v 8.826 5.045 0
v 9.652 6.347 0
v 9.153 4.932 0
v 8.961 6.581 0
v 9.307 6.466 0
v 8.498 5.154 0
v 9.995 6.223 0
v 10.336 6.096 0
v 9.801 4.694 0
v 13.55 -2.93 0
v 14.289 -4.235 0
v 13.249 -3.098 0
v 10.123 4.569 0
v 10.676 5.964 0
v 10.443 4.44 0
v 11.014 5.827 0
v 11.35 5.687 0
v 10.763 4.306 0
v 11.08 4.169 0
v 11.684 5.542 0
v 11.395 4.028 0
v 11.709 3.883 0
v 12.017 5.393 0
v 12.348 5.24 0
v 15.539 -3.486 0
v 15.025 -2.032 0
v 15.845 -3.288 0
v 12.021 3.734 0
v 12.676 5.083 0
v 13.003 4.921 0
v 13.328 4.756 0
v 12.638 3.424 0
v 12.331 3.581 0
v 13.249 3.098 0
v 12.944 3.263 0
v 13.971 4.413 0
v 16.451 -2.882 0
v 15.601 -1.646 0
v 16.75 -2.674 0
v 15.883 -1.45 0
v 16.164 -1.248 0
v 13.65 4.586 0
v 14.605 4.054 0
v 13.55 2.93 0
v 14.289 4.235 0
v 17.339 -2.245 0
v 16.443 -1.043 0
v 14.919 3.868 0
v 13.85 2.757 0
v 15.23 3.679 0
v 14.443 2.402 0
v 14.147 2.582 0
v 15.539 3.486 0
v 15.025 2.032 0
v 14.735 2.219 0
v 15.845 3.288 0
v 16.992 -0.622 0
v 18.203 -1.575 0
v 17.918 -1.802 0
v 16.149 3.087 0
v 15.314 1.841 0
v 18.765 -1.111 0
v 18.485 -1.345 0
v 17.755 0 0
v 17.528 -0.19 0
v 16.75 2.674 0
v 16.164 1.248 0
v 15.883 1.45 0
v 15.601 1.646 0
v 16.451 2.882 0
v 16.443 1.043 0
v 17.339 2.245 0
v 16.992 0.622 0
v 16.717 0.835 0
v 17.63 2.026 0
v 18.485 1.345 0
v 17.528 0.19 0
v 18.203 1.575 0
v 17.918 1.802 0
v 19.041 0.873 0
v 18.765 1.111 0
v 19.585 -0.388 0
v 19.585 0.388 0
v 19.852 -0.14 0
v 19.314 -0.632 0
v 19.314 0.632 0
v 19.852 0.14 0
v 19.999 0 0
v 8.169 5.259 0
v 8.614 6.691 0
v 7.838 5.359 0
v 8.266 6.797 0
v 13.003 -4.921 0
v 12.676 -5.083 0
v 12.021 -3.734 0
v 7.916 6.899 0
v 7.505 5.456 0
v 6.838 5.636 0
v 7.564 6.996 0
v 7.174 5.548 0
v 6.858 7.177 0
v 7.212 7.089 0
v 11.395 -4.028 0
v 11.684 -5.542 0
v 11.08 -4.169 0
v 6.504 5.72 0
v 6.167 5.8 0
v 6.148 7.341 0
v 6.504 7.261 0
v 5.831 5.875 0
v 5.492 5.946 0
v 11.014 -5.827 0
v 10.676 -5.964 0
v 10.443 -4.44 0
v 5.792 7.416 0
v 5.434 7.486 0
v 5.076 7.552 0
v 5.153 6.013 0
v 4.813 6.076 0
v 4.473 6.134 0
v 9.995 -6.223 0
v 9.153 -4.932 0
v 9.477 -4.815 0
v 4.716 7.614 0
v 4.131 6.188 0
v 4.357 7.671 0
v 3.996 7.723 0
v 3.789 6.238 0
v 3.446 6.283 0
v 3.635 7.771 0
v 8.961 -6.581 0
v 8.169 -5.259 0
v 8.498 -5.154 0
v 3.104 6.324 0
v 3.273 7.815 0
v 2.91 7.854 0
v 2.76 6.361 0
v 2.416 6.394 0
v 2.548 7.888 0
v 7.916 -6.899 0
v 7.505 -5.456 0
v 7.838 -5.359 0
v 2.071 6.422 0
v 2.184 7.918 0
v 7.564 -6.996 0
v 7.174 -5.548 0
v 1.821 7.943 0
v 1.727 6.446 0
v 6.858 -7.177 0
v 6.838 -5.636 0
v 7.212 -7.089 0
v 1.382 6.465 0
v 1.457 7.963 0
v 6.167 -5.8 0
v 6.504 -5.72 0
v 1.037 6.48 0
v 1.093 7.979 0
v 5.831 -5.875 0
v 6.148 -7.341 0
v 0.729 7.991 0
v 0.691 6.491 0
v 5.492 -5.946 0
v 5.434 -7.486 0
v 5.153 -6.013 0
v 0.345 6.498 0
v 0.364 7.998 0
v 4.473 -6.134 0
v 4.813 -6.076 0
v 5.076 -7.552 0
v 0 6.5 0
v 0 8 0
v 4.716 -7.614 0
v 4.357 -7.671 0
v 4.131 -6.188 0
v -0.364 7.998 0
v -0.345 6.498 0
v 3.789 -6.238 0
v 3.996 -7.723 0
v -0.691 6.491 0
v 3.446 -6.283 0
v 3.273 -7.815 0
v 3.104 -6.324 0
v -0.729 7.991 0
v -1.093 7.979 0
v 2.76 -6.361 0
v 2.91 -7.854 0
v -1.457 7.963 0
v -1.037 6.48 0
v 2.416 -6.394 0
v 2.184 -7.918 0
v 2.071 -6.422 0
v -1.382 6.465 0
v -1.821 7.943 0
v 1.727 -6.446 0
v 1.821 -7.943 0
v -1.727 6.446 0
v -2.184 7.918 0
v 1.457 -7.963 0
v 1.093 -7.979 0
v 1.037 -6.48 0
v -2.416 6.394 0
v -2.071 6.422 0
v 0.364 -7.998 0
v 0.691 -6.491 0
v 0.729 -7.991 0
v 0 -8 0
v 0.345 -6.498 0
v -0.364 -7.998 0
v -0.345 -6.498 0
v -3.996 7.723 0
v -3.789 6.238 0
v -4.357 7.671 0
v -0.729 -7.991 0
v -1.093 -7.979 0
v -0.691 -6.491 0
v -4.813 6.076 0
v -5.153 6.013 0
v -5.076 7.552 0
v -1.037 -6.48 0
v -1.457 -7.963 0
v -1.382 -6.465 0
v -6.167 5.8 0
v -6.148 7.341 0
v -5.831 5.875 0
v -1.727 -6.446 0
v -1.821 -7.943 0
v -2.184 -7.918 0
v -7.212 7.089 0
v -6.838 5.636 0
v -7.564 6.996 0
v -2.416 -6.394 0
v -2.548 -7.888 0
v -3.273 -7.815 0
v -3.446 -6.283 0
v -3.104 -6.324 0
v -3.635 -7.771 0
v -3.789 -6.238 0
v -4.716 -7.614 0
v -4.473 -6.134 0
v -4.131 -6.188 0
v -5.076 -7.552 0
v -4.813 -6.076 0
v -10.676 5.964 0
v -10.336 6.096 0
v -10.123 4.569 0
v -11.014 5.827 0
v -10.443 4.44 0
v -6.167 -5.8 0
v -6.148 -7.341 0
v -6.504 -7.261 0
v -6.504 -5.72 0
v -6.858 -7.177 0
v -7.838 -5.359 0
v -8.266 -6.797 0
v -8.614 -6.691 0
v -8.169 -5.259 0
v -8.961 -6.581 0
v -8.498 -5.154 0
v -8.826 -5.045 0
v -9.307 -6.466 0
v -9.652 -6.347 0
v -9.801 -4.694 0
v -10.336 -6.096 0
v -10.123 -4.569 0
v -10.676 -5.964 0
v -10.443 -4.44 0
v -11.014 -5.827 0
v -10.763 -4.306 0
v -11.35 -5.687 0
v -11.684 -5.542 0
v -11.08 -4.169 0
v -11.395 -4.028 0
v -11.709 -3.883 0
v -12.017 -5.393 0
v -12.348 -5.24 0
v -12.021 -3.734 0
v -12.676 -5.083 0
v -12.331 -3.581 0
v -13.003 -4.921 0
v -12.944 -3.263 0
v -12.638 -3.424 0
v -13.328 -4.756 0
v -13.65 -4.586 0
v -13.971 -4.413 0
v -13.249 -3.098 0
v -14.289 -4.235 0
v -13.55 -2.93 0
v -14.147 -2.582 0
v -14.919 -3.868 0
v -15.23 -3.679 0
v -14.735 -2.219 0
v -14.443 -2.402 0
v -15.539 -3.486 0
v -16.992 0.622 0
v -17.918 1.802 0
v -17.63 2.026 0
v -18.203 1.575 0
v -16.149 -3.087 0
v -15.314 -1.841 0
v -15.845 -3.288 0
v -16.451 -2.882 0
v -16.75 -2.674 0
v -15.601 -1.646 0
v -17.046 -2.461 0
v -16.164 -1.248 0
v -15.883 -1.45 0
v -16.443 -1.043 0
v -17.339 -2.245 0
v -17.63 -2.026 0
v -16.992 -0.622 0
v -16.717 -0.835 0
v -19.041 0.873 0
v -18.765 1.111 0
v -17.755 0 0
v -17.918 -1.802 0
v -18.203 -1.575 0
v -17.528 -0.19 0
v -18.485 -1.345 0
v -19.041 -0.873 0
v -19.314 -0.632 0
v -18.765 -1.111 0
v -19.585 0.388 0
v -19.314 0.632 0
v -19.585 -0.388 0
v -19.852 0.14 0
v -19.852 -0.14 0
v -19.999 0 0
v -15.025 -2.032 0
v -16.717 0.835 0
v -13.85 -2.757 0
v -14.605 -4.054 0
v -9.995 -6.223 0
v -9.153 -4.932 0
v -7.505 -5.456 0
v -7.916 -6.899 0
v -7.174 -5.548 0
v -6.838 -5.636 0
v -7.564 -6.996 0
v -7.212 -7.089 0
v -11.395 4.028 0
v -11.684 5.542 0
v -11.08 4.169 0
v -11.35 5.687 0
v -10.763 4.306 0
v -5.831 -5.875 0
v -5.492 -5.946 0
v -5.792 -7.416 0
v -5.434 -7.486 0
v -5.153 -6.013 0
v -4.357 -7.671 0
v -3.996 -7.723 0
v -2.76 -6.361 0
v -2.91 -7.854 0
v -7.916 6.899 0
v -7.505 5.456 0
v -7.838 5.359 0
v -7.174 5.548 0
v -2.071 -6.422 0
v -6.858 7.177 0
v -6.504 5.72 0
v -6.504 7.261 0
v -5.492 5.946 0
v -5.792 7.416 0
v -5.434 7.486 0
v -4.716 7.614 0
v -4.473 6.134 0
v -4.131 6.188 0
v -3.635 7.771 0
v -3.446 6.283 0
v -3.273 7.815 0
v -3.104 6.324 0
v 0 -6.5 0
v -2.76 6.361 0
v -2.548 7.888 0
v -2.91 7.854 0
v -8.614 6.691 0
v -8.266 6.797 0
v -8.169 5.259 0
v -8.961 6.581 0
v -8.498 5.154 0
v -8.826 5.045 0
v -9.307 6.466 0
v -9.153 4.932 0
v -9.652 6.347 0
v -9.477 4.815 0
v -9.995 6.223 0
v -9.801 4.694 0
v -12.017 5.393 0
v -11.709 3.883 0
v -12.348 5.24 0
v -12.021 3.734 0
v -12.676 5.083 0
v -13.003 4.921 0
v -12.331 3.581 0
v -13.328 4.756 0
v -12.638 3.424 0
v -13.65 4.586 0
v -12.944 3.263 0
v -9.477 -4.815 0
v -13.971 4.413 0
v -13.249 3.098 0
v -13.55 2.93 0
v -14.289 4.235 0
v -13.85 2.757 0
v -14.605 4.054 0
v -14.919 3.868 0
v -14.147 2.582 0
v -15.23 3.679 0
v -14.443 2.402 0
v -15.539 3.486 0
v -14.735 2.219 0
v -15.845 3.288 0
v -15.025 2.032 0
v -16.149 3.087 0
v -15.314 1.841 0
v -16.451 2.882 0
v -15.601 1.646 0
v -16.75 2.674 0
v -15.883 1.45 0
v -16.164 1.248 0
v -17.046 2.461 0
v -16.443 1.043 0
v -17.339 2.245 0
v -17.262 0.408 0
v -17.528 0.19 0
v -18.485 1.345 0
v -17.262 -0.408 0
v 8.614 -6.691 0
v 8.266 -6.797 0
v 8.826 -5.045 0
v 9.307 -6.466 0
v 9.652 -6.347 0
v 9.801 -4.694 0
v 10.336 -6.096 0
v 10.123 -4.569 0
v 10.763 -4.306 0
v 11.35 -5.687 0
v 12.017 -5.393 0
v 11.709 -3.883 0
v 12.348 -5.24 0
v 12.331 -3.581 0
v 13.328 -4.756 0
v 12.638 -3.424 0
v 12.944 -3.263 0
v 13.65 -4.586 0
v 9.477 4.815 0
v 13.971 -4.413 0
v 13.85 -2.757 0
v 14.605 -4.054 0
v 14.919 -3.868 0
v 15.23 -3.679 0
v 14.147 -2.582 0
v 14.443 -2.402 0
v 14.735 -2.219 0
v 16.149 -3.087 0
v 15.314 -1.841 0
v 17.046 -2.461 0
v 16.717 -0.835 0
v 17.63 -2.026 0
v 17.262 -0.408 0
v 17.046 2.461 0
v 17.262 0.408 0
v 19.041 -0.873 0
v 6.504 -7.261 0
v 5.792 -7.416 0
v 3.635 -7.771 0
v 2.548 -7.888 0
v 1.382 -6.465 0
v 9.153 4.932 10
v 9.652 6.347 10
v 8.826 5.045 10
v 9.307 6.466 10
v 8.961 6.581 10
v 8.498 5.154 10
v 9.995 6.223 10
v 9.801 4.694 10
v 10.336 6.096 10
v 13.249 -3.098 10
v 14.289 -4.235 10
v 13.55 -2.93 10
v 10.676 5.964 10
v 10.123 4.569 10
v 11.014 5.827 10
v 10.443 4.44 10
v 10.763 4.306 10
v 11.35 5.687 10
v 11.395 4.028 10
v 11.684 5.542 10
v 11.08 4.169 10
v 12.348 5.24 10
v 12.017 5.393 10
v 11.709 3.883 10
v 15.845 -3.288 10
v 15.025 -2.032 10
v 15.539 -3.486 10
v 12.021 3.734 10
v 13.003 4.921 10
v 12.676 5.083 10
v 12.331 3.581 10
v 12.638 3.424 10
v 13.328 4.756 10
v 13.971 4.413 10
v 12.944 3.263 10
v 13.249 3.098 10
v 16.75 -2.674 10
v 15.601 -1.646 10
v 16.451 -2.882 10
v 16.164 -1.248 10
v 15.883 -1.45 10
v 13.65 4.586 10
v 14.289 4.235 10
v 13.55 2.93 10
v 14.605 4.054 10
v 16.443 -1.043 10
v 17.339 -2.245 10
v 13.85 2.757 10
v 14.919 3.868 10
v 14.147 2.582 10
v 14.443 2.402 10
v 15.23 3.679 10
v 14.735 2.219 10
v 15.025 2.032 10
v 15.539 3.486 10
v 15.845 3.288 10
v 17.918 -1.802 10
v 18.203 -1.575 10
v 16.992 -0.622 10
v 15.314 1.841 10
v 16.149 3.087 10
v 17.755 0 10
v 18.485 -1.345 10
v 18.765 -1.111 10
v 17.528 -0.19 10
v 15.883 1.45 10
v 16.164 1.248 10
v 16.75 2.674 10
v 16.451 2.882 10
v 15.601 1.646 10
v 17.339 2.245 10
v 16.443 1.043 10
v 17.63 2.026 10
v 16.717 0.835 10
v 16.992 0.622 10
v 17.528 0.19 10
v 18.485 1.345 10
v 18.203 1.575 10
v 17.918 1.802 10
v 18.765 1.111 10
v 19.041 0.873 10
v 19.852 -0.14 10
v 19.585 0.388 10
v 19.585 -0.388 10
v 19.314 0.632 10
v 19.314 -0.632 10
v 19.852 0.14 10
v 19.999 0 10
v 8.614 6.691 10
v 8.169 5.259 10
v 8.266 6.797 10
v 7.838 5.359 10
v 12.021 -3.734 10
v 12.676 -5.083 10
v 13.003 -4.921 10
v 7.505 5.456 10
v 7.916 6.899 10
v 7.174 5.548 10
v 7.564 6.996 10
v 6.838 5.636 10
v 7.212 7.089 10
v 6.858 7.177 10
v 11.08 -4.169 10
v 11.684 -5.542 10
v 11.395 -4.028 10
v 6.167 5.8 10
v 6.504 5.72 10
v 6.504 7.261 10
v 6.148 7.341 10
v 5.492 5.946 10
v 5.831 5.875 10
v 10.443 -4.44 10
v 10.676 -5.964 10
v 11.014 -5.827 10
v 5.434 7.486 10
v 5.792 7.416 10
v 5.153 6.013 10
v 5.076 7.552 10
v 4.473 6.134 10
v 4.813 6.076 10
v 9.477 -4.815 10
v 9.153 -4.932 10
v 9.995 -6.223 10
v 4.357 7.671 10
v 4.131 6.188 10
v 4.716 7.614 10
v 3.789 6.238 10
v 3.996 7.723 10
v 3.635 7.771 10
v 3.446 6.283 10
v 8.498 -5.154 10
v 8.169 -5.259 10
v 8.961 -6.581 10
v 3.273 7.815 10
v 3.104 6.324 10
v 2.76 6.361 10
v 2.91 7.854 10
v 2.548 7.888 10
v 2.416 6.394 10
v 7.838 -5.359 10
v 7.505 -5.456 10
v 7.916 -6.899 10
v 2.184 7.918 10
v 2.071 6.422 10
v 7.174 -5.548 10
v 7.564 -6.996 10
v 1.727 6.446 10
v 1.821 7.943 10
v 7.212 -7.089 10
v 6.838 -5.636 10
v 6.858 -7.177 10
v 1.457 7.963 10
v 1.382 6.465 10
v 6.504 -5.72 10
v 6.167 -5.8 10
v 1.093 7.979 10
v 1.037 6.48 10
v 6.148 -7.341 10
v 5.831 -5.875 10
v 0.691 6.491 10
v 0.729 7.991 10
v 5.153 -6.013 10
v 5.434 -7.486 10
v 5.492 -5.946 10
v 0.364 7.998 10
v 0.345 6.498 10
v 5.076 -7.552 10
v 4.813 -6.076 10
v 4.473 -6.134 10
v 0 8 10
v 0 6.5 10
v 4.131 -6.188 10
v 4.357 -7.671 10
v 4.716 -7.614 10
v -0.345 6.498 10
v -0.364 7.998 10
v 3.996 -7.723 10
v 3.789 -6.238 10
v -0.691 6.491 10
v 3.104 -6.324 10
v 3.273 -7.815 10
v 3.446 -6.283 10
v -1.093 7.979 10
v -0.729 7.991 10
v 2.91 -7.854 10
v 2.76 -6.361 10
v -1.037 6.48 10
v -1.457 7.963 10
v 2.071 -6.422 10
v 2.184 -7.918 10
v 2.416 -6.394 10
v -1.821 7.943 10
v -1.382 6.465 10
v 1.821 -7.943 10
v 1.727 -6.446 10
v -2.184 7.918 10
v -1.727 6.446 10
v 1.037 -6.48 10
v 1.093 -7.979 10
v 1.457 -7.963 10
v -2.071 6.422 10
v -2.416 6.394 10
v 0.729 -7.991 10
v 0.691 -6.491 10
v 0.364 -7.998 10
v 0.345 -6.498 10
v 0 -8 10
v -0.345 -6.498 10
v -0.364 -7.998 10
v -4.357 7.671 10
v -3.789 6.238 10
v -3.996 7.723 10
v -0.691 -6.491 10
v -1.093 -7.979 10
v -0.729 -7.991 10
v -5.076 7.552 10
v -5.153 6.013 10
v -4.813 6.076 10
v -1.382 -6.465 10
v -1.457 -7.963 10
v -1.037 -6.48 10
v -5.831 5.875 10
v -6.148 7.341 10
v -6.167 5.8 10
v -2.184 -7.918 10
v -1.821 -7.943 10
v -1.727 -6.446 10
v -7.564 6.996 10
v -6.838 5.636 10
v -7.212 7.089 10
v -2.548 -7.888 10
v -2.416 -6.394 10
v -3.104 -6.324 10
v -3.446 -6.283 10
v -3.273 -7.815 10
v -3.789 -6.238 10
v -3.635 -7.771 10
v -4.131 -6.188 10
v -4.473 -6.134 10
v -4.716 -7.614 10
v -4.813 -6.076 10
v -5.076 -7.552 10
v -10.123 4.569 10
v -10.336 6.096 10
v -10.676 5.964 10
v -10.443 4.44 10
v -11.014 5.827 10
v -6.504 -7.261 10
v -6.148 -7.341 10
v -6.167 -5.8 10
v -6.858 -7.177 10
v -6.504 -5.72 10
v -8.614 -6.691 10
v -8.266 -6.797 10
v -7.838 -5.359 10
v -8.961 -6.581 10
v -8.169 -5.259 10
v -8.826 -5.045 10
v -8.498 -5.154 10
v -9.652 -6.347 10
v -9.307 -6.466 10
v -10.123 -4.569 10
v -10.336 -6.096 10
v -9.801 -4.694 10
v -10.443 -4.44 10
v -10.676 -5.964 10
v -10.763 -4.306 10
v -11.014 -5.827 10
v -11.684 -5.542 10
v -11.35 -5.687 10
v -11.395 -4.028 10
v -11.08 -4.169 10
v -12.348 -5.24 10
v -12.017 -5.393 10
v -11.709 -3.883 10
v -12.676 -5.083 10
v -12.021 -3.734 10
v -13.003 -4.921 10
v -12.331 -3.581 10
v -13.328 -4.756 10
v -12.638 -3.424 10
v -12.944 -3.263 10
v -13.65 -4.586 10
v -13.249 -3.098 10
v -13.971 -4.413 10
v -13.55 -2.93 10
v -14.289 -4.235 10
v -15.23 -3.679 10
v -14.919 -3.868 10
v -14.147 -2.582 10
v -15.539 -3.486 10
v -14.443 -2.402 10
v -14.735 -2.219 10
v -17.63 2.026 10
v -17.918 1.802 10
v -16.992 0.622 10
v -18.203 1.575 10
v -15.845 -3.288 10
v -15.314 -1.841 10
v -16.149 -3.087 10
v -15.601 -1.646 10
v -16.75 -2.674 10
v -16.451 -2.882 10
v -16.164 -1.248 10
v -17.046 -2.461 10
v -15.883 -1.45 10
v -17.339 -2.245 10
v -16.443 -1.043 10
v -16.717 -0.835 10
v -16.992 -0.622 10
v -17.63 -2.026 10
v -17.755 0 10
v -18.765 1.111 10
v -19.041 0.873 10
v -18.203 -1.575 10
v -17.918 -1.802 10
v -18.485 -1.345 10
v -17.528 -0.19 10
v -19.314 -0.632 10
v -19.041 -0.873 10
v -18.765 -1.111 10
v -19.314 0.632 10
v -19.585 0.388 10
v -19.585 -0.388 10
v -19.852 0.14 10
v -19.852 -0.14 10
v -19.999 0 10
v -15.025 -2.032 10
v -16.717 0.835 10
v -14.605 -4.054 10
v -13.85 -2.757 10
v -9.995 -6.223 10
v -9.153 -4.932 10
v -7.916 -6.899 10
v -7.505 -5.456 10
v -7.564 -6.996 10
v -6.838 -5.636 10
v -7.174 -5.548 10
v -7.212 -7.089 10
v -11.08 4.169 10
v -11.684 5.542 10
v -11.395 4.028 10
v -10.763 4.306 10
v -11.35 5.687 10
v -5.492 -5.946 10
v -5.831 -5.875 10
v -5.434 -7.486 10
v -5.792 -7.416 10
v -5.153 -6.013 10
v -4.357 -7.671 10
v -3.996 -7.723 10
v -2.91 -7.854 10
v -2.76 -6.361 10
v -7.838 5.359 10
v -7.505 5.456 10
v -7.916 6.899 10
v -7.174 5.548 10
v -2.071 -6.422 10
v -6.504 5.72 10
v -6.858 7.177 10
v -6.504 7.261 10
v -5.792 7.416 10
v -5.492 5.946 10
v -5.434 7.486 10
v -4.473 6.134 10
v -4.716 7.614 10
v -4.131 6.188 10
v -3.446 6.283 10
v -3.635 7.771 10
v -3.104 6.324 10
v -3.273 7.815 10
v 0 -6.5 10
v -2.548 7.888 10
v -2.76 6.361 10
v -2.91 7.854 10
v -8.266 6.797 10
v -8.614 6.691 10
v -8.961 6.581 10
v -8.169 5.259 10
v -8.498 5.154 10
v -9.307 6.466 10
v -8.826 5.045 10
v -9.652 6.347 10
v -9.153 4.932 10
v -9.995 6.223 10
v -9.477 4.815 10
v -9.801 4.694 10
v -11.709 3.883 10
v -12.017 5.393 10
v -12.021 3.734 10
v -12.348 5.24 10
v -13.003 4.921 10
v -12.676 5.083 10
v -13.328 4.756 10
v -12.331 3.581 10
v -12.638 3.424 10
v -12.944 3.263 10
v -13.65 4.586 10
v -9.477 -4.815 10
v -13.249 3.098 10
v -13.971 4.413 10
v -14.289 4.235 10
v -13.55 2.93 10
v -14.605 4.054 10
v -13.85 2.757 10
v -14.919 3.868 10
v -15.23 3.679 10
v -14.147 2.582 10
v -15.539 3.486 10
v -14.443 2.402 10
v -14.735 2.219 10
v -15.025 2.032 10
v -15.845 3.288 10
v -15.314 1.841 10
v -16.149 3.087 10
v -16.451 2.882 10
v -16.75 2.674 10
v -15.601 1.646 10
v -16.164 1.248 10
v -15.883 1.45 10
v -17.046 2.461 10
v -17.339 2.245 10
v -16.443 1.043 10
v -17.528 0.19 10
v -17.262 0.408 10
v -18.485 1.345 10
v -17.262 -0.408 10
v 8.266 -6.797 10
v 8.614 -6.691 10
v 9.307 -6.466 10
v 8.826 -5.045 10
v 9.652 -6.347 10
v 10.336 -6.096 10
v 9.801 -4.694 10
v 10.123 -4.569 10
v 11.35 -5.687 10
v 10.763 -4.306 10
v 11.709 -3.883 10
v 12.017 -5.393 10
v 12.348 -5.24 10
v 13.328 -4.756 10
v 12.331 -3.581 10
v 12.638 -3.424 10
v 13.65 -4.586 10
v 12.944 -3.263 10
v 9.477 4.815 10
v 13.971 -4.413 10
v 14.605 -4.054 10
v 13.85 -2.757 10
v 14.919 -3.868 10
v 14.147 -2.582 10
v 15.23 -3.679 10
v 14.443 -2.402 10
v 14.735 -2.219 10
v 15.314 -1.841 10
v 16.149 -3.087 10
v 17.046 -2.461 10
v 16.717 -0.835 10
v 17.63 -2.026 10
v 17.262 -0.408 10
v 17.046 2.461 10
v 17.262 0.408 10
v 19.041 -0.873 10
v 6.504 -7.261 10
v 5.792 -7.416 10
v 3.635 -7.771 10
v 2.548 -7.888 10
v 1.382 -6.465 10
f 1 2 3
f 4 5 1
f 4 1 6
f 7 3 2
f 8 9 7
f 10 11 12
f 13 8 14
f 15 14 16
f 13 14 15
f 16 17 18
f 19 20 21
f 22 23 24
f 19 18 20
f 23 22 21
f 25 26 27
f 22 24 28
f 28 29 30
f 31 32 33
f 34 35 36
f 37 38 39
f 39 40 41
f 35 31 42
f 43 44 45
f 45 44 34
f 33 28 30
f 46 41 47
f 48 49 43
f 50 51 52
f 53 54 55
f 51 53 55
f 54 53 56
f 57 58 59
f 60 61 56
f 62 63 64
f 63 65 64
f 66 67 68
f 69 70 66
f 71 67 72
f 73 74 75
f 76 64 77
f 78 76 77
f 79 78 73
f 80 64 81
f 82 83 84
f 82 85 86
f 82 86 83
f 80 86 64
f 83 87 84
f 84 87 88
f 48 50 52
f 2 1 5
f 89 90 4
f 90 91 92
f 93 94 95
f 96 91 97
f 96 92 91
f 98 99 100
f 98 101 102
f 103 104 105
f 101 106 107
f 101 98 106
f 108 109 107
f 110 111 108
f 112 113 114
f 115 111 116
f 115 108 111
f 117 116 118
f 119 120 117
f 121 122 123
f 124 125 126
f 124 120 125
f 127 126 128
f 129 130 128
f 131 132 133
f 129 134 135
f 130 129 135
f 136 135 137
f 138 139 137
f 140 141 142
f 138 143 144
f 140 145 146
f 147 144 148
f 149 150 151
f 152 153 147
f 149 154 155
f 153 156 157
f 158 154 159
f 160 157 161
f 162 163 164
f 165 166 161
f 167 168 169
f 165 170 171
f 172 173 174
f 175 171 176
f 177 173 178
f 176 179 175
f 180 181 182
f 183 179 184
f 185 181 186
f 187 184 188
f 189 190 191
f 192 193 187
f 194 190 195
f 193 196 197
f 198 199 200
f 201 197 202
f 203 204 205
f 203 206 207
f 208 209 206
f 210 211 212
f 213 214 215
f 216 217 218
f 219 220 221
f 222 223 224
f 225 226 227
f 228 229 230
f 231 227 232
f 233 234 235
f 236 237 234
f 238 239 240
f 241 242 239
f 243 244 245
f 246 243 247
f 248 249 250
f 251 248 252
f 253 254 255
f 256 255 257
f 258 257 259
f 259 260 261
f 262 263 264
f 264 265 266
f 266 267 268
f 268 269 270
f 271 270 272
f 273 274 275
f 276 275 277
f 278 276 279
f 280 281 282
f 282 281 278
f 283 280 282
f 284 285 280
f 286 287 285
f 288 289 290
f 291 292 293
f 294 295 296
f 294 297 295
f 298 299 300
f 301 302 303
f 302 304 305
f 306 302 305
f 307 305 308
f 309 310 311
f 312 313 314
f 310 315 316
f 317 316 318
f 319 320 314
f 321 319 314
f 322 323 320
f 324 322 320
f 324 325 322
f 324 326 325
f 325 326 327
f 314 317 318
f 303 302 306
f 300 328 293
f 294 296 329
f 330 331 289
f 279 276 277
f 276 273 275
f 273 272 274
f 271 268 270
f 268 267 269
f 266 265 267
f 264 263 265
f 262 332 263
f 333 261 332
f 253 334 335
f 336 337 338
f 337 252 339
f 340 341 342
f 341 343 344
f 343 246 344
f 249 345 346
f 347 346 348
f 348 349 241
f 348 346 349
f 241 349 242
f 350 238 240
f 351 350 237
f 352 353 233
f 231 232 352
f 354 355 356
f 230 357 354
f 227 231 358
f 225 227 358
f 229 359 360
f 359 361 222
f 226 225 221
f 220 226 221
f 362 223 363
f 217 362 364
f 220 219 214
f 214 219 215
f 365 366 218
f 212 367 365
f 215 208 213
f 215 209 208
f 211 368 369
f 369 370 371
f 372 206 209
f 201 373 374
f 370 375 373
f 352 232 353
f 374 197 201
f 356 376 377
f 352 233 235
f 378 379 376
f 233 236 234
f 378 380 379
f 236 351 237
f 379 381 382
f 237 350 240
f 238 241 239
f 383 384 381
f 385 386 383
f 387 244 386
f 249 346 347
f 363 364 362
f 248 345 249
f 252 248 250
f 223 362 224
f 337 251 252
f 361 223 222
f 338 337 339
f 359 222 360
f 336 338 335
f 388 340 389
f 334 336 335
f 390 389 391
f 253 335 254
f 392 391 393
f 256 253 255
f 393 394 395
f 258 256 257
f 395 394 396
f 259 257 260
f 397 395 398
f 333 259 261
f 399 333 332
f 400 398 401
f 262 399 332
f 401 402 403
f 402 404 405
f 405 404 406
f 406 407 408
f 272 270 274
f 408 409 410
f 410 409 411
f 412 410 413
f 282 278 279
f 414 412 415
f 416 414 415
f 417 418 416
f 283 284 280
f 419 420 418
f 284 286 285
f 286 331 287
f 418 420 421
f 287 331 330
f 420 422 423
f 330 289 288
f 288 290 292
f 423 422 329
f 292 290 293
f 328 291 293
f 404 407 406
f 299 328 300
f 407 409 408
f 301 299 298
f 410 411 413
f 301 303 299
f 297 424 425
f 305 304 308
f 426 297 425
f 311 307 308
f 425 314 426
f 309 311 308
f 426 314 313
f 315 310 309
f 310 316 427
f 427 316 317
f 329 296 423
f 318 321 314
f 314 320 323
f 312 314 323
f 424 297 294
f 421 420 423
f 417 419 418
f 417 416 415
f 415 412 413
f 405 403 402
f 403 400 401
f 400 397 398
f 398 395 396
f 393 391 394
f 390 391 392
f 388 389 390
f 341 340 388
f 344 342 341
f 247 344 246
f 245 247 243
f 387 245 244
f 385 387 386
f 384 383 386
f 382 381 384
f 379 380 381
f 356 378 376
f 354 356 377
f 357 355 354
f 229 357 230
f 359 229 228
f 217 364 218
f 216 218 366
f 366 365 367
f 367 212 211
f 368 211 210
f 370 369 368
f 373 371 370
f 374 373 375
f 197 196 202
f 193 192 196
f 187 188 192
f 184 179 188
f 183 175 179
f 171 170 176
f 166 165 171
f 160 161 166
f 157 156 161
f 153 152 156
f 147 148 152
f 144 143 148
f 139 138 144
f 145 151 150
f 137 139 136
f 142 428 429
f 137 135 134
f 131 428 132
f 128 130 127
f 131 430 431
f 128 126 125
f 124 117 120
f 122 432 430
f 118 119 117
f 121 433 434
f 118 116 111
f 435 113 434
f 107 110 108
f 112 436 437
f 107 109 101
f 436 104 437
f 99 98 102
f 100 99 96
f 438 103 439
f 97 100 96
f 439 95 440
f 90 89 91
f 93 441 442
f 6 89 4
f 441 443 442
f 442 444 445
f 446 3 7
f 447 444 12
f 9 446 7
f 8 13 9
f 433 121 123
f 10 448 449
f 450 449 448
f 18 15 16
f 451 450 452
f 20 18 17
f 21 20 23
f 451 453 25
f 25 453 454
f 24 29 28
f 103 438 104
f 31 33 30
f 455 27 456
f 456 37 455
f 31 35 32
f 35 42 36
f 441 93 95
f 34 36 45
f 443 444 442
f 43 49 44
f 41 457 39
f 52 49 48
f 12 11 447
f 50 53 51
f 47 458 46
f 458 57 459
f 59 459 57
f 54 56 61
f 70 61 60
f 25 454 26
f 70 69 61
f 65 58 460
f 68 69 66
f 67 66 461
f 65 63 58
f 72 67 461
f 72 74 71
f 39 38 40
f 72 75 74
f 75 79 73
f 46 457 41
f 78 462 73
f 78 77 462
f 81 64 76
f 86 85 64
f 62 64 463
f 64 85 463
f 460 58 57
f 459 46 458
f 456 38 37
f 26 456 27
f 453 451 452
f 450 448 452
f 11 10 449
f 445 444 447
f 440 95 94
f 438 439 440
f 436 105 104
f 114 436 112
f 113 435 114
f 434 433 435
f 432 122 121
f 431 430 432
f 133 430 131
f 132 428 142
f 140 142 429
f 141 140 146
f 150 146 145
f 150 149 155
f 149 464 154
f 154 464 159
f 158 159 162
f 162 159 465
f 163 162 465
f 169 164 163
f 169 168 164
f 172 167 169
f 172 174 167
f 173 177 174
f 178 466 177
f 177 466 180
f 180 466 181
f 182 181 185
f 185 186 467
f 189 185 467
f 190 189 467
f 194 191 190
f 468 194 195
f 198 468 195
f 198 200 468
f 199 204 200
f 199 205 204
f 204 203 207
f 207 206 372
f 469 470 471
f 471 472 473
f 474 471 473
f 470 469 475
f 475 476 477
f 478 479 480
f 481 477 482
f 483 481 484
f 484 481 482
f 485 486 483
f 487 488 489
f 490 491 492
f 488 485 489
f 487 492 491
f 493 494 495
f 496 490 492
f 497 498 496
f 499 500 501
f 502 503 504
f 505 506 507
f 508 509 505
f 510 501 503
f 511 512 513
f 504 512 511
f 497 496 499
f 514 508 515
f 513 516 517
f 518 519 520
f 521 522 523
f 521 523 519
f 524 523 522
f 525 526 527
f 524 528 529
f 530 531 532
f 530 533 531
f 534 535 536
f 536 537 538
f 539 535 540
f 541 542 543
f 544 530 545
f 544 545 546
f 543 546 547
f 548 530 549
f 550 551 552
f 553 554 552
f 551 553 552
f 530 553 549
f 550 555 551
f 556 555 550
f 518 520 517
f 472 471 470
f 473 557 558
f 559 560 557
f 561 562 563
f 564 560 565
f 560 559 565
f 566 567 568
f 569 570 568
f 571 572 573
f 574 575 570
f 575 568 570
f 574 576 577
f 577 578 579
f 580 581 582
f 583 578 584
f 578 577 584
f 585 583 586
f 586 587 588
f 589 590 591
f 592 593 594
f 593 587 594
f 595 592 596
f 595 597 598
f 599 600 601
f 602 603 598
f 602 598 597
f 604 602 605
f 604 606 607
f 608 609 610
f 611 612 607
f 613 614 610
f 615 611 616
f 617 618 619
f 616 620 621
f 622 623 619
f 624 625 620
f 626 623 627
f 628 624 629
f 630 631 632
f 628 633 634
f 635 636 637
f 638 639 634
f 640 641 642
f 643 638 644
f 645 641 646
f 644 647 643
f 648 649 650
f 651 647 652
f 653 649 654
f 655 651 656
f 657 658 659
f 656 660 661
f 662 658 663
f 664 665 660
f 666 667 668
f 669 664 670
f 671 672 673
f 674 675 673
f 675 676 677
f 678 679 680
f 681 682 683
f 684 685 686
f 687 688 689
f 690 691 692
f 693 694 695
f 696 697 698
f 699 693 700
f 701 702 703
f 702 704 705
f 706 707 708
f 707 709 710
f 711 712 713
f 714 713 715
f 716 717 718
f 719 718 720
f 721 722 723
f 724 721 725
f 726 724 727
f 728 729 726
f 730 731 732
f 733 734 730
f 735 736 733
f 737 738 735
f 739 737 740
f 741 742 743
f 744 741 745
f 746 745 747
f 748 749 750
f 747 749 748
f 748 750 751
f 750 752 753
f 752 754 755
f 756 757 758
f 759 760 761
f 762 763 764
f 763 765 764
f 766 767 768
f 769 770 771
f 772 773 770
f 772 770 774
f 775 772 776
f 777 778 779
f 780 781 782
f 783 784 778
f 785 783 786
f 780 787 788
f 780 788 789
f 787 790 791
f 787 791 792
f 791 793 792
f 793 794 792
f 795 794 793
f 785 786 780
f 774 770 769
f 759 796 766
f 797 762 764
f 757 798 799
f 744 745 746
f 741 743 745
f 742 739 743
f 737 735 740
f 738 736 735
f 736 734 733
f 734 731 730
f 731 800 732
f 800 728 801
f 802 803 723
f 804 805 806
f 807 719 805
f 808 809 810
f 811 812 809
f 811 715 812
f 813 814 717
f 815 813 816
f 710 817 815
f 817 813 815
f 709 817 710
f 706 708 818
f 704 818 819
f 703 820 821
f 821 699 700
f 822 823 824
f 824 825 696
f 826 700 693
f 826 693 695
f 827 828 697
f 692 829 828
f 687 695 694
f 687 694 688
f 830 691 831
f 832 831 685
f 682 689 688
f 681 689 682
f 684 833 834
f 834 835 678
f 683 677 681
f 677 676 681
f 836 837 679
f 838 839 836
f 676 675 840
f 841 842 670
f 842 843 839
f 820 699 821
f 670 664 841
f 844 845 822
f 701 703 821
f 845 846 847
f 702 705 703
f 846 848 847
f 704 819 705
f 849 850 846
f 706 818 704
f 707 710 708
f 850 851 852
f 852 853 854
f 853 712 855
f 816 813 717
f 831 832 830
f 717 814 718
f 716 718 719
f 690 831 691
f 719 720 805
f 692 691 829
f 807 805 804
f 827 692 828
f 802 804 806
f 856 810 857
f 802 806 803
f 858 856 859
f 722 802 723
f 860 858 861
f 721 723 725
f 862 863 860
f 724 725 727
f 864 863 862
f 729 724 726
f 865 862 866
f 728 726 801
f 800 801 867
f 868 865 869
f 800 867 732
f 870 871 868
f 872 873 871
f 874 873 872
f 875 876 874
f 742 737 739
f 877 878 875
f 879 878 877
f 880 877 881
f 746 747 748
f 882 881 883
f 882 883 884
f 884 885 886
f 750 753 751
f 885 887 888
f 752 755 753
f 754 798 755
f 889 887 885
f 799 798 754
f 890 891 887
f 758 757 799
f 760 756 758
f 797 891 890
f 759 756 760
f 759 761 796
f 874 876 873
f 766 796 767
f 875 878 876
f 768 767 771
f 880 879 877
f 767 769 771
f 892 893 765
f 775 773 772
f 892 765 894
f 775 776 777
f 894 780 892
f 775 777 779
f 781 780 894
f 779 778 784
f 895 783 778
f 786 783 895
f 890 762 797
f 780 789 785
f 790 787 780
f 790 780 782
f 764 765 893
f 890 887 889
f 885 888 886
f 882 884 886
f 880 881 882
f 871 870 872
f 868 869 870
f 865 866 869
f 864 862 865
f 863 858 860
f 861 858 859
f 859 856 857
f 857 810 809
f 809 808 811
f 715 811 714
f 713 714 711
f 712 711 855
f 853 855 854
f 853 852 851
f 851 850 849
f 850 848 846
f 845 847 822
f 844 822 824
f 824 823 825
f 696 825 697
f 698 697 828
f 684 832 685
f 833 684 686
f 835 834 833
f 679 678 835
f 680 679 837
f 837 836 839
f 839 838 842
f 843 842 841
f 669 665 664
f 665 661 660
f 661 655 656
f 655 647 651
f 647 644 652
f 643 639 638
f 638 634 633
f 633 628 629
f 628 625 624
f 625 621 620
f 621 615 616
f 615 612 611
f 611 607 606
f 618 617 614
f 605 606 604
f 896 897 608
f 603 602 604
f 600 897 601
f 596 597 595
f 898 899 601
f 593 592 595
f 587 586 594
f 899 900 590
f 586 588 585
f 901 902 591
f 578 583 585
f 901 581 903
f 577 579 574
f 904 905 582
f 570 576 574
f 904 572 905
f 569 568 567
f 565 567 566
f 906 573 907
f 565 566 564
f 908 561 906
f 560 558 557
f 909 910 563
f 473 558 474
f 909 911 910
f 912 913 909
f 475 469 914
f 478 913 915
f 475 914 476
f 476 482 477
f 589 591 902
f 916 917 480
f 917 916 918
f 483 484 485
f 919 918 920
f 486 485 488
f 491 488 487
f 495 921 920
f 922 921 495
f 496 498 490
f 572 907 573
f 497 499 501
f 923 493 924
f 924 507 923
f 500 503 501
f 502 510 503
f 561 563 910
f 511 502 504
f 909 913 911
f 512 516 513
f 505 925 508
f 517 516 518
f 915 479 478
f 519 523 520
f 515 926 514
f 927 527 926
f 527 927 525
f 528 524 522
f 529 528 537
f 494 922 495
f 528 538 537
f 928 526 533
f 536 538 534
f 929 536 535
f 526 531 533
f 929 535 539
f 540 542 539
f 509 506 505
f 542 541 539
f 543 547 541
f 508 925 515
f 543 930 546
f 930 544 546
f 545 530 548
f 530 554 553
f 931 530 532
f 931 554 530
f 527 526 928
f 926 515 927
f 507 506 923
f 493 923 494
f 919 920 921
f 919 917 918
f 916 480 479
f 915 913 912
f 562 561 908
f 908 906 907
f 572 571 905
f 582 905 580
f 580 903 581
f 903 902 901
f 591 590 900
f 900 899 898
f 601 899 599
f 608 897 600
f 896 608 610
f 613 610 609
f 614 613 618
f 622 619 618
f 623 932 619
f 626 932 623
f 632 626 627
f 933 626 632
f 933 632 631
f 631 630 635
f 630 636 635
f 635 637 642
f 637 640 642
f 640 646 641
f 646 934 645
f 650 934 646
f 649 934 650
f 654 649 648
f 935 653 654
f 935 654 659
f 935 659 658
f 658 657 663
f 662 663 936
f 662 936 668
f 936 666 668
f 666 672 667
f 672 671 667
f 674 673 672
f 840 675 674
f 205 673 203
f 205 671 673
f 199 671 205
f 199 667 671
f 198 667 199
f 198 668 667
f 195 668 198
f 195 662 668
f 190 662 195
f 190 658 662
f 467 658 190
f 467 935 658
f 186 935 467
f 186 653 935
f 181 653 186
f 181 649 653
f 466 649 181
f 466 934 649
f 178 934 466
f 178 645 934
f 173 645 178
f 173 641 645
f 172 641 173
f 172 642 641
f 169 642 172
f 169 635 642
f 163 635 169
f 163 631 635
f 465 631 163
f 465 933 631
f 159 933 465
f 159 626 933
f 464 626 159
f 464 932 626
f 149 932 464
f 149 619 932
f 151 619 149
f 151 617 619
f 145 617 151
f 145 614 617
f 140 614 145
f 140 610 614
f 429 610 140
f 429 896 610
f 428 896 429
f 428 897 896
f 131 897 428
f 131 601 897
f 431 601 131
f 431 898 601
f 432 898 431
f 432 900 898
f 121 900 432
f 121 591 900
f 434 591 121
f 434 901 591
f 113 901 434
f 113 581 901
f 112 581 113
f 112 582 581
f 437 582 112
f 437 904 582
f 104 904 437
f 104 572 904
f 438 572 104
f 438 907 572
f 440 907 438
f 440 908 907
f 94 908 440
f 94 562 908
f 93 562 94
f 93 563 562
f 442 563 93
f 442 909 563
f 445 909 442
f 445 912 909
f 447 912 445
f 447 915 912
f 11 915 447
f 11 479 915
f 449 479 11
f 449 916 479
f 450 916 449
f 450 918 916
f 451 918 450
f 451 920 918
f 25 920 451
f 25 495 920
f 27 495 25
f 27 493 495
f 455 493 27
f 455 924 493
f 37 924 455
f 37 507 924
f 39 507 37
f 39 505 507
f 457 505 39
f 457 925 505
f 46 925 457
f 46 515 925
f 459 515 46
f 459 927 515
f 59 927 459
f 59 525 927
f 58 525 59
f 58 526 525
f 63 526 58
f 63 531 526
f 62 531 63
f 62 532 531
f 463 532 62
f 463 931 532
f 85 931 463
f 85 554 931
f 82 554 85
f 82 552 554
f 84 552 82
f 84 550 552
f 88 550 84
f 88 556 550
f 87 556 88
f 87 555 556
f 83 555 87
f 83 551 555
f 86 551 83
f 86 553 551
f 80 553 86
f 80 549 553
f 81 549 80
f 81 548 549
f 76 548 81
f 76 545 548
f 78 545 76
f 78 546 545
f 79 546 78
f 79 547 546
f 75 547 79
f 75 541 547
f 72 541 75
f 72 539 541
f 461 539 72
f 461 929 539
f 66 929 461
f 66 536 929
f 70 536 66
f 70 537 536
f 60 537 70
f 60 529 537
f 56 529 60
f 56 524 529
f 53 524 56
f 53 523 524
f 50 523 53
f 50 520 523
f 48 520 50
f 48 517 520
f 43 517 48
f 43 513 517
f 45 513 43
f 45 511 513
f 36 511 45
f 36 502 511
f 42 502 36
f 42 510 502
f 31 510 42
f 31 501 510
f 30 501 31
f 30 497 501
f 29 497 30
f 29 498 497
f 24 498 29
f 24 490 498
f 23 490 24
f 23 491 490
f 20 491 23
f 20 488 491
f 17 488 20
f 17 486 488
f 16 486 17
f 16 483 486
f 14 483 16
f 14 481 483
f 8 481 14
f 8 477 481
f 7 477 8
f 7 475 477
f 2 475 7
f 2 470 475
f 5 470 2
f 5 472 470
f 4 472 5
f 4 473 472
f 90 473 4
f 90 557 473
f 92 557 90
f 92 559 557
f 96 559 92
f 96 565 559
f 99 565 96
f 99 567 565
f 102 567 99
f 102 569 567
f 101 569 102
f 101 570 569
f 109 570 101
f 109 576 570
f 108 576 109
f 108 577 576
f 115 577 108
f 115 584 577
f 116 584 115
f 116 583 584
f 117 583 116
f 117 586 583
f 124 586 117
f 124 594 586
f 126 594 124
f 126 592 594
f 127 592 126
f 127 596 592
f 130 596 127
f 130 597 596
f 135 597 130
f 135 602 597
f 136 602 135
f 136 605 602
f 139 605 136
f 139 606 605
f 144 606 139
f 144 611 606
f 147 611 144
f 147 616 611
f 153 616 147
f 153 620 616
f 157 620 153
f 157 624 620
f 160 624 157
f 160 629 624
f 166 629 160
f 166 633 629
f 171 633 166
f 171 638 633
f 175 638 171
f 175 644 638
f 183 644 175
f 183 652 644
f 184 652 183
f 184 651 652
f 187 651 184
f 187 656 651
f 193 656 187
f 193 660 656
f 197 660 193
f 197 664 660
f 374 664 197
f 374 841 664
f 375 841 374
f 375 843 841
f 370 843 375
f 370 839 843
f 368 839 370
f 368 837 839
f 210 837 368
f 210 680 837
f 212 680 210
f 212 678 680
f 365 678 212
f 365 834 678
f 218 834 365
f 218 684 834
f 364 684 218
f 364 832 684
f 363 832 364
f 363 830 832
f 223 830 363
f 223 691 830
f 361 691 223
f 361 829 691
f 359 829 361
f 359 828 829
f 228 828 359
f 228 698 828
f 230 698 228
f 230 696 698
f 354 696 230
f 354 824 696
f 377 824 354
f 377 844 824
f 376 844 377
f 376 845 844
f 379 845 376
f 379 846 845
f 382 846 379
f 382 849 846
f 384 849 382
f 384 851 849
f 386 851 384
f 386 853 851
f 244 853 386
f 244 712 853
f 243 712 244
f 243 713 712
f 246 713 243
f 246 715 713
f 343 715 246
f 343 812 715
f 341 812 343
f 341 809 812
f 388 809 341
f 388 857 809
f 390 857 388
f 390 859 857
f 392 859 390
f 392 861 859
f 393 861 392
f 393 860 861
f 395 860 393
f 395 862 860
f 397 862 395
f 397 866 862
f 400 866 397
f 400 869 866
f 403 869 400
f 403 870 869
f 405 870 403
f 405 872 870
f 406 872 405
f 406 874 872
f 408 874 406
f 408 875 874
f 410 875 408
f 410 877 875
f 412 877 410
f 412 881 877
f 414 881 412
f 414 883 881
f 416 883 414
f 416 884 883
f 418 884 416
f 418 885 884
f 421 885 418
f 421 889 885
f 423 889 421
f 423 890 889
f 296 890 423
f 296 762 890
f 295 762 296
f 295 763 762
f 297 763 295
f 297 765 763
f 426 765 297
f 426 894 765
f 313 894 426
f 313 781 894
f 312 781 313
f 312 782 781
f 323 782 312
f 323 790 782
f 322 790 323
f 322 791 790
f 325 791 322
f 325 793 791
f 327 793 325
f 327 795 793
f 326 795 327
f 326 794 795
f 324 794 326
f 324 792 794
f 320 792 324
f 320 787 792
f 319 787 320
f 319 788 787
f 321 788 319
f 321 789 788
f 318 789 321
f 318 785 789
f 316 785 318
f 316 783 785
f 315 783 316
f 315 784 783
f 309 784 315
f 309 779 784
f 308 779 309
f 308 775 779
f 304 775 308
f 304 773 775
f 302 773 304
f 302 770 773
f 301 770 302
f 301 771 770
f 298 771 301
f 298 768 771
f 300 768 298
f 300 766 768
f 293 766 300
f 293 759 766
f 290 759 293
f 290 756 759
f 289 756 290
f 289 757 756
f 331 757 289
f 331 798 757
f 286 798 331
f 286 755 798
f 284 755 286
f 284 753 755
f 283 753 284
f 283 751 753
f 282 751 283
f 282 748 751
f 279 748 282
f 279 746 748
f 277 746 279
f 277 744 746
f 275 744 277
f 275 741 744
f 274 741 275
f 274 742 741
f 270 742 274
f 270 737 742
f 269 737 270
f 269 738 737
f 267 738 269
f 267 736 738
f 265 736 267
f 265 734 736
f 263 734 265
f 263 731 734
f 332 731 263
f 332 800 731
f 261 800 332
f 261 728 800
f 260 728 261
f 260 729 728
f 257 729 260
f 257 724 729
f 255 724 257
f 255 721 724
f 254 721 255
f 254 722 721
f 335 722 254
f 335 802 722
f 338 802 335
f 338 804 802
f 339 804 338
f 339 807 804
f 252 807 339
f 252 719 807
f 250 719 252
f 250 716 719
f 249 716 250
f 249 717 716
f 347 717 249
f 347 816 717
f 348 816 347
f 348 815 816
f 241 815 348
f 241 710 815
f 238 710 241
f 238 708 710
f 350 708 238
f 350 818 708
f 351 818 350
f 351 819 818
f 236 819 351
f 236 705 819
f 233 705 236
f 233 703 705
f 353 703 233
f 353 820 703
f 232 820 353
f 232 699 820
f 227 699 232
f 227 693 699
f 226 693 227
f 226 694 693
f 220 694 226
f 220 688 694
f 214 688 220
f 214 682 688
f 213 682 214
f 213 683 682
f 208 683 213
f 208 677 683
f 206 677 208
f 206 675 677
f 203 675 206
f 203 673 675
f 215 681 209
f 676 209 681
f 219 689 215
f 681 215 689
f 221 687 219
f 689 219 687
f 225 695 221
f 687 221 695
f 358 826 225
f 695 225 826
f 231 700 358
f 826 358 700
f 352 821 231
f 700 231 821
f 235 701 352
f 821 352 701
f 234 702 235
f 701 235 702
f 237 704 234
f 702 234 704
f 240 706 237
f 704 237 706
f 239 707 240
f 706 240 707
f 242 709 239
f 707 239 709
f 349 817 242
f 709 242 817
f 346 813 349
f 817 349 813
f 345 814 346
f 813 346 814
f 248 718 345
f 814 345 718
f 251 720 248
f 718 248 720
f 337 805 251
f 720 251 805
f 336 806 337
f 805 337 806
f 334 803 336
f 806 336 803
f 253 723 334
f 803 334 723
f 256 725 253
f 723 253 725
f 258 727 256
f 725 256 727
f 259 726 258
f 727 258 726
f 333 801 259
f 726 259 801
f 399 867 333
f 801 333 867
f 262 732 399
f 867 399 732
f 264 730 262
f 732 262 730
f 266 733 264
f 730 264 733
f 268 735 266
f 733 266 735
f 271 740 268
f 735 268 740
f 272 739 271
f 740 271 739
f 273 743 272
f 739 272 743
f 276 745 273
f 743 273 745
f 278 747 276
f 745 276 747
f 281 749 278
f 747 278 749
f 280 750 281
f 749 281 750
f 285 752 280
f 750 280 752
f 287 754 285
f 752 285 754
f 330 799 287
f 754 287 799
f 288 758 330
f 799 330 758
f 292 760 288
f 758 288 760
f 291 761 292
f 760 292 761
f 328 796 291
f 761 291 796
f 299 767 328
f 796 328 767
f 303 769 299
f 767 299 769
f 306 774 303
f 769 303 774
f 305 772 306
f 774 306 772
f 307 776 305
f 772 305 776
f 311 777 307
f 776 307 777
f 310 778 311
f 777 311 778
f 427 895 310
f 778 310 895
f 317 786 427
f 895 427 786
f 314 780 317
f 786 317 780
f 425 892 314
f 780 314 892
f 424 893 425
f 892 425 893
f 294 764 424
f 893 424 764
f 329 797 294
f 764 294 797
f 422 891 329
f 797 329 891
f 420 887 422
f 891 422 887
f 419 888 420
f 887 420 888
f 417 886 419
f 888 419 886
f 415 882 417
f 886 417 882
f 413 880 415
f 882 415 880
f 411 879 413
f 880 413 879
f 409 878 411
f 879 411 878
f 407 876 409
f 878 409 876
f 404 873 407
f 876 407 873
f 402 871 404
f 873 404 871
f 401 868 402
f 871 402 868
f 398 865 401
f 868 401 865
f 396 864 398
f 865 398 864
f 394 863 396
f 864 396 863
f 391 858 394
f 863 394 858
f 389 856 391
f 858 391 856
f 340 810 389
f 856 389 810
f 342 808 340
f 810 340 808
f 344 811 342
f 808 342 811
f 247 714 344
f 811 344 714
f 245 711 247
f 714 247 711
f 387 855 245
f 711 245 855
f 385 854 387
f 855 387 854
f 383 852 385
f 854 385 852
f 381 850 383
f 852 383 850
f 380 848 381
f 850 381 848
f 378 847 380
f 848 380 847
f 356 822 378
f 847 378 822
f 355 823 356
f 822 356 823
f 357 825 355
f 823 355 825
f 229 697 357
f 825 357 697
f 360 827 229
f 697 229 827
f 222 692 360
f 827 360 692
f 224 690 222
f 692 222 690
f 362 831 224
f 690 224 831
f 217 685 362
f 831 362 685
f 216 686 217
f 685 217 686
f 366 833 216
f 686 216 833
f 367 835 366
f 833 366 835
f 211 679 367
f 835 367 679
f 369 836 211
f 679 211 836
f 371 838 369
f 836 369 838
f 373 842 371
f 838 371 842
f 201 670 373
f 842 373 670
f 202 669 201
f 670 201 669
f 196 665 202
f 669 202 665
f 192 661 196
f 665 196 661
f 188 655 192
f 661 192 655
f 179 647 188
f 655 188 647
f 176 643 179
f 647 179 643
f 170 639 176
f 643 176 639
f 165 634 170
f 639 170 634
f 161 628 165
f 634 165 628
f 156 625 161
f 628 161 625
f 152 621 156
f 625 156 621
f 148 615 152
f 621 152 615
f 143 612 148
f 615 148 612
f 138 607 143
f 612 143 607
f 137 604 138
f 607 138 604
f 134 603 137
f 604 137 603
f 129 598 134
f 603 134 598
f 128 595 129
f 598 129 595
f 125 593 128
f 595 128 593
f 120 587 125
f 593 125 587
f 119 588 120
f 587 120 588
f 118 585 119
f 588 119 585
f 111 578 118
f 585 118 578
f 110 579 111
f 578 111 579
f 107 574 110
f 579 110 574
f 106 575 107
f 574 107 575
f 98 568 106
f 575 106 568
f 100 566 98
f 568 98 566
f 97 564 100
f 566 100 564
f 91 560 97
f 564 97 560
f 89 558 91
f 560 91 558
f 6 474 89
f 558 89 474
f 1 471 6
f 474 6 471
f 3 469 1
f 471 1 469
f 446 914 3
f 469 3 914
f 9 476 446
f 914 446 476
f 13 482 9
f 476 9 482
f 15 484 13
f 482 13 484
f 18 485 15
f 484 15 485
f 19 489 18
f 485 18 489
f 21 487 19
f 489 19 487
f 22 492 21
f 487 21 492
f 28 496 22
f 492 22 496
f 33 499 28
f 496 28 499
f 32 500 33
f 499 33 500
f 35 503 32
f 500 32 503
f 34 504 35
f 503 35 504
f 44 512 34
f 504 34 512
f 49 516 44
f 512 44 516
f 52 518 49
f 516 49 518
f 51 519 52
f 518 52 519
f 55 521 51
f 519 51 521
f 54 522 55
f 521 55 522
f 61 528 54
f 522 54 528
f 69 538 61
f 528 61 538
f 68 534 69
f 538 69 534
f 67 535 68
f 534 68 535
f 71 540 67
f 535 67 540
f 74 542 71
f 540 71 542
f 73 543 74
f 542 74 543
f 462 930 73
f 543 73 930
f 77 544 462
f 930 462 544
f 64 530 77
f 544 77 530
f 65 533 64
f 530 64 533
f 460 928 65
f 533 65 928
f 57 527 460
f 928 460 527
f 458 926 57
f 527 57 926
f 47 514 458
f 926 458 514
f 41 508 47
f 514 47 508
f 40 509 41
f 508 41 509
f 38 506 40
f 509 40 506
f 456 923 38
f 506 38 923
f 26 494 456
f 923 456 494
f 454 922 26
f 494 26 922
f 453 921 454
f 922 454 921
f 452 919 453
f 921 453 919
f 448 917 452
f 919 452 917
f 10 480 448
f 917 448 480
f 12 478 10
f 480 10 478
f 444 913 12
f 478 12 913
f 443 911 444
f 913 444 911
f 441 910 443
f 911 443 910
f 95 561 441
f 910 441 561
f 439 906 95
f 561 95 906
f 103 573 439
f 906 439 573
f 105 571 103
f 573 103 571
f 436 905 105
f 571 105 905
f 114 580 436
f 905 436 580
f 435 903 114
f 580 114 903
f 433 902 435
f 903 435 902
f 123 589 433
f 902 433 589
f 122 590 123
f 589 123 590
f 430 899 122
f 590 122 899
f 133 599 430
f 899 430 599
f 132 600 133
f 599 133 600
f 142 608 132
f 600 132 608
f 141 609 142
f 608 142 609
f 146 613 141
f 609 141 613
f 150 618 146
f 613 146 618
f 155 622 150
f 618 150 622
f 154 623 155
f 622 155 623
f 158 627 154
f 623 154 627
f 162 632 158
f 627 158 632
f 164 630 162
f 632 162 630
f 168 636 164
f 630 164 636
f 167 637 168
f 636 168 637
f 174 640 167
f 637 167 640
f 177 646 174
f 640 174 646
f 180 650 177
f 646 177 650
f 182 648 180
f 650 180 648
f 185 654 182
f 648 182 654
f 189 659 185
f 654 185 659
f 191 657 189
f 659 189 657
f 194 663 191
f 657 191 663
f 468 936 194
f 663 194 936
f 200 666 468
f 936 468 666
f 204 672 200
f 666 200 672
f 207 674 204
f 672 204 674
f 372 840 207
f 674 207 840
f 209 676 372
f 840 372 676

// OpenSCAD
/*
Copyright (C) Saeed Gholami Shahbandi. All rights reserved.
Author: Saeed Gholami Shahbandi (saeed.gh.sh@gmail.com)

This file is part of Arrangement Library.
The of Arrangement Library is free software: you can redistribute it and/or
modify it under the terms of the GNU Lesser General Public License as published
by the Free Software Foundation, either version 3 of the License,
or (at your option) any later version.

This program is distributed in the hope that it will be useful, but WITHOUT ANY
WARRANTY; without even the implied warranty of MERCHANTABILITY or FITNESS FOR A
PARTICULAR PURPOSE. See the GNU Lesser General Public License for more details.

You should have received a copy of the GNU Lesser General Public License along
with this program. If not, see <http://www.gnu.org/licenses/>
*/

fragments = 500;

//------------------------------------------------------------
//  Parametric eye-shaped ring  (two-circle intersection)
//
//  width      : full horizontal size  (mm)
//  height     : full vertical size    (mm)
//  wall       : ring wall thickness   (mm)
//  thickness  : extrusion in Z        (mm)
//
//  Geometry (centres on ±c along Y):
//      let  w = width/2 , h = height/2
//      c = (w² − h²) / (2h)
//      r = (w² + h²) / (2h)          (so that r − c = h)
//------------------------------------------------------------

width      = 40;
height     = 16;
wall       =  1.5;
thickness  = 10;

module eye2d(w,h) {
    c = (w*w - h*h) / (2*h);          // centre offset (±c)
    r = (w*w + h*h) / (2*h);          // circle radius
    intersection() {
        translate([0,  c]) circle(r, $fn=fragments);
        translate([0, -c]) circle(r, $fn=fragments);
    }
}

module eye_ring() {
    w = width  / 2;
    h = height / 2;
    linear_extrude(thickness) difference() {
        eye2d(w,h);                       // outer surface
        offset(-wall)
            eye2d(w,h);                   // inner surface (hollow)
    }
}

eye_ring();   // render
